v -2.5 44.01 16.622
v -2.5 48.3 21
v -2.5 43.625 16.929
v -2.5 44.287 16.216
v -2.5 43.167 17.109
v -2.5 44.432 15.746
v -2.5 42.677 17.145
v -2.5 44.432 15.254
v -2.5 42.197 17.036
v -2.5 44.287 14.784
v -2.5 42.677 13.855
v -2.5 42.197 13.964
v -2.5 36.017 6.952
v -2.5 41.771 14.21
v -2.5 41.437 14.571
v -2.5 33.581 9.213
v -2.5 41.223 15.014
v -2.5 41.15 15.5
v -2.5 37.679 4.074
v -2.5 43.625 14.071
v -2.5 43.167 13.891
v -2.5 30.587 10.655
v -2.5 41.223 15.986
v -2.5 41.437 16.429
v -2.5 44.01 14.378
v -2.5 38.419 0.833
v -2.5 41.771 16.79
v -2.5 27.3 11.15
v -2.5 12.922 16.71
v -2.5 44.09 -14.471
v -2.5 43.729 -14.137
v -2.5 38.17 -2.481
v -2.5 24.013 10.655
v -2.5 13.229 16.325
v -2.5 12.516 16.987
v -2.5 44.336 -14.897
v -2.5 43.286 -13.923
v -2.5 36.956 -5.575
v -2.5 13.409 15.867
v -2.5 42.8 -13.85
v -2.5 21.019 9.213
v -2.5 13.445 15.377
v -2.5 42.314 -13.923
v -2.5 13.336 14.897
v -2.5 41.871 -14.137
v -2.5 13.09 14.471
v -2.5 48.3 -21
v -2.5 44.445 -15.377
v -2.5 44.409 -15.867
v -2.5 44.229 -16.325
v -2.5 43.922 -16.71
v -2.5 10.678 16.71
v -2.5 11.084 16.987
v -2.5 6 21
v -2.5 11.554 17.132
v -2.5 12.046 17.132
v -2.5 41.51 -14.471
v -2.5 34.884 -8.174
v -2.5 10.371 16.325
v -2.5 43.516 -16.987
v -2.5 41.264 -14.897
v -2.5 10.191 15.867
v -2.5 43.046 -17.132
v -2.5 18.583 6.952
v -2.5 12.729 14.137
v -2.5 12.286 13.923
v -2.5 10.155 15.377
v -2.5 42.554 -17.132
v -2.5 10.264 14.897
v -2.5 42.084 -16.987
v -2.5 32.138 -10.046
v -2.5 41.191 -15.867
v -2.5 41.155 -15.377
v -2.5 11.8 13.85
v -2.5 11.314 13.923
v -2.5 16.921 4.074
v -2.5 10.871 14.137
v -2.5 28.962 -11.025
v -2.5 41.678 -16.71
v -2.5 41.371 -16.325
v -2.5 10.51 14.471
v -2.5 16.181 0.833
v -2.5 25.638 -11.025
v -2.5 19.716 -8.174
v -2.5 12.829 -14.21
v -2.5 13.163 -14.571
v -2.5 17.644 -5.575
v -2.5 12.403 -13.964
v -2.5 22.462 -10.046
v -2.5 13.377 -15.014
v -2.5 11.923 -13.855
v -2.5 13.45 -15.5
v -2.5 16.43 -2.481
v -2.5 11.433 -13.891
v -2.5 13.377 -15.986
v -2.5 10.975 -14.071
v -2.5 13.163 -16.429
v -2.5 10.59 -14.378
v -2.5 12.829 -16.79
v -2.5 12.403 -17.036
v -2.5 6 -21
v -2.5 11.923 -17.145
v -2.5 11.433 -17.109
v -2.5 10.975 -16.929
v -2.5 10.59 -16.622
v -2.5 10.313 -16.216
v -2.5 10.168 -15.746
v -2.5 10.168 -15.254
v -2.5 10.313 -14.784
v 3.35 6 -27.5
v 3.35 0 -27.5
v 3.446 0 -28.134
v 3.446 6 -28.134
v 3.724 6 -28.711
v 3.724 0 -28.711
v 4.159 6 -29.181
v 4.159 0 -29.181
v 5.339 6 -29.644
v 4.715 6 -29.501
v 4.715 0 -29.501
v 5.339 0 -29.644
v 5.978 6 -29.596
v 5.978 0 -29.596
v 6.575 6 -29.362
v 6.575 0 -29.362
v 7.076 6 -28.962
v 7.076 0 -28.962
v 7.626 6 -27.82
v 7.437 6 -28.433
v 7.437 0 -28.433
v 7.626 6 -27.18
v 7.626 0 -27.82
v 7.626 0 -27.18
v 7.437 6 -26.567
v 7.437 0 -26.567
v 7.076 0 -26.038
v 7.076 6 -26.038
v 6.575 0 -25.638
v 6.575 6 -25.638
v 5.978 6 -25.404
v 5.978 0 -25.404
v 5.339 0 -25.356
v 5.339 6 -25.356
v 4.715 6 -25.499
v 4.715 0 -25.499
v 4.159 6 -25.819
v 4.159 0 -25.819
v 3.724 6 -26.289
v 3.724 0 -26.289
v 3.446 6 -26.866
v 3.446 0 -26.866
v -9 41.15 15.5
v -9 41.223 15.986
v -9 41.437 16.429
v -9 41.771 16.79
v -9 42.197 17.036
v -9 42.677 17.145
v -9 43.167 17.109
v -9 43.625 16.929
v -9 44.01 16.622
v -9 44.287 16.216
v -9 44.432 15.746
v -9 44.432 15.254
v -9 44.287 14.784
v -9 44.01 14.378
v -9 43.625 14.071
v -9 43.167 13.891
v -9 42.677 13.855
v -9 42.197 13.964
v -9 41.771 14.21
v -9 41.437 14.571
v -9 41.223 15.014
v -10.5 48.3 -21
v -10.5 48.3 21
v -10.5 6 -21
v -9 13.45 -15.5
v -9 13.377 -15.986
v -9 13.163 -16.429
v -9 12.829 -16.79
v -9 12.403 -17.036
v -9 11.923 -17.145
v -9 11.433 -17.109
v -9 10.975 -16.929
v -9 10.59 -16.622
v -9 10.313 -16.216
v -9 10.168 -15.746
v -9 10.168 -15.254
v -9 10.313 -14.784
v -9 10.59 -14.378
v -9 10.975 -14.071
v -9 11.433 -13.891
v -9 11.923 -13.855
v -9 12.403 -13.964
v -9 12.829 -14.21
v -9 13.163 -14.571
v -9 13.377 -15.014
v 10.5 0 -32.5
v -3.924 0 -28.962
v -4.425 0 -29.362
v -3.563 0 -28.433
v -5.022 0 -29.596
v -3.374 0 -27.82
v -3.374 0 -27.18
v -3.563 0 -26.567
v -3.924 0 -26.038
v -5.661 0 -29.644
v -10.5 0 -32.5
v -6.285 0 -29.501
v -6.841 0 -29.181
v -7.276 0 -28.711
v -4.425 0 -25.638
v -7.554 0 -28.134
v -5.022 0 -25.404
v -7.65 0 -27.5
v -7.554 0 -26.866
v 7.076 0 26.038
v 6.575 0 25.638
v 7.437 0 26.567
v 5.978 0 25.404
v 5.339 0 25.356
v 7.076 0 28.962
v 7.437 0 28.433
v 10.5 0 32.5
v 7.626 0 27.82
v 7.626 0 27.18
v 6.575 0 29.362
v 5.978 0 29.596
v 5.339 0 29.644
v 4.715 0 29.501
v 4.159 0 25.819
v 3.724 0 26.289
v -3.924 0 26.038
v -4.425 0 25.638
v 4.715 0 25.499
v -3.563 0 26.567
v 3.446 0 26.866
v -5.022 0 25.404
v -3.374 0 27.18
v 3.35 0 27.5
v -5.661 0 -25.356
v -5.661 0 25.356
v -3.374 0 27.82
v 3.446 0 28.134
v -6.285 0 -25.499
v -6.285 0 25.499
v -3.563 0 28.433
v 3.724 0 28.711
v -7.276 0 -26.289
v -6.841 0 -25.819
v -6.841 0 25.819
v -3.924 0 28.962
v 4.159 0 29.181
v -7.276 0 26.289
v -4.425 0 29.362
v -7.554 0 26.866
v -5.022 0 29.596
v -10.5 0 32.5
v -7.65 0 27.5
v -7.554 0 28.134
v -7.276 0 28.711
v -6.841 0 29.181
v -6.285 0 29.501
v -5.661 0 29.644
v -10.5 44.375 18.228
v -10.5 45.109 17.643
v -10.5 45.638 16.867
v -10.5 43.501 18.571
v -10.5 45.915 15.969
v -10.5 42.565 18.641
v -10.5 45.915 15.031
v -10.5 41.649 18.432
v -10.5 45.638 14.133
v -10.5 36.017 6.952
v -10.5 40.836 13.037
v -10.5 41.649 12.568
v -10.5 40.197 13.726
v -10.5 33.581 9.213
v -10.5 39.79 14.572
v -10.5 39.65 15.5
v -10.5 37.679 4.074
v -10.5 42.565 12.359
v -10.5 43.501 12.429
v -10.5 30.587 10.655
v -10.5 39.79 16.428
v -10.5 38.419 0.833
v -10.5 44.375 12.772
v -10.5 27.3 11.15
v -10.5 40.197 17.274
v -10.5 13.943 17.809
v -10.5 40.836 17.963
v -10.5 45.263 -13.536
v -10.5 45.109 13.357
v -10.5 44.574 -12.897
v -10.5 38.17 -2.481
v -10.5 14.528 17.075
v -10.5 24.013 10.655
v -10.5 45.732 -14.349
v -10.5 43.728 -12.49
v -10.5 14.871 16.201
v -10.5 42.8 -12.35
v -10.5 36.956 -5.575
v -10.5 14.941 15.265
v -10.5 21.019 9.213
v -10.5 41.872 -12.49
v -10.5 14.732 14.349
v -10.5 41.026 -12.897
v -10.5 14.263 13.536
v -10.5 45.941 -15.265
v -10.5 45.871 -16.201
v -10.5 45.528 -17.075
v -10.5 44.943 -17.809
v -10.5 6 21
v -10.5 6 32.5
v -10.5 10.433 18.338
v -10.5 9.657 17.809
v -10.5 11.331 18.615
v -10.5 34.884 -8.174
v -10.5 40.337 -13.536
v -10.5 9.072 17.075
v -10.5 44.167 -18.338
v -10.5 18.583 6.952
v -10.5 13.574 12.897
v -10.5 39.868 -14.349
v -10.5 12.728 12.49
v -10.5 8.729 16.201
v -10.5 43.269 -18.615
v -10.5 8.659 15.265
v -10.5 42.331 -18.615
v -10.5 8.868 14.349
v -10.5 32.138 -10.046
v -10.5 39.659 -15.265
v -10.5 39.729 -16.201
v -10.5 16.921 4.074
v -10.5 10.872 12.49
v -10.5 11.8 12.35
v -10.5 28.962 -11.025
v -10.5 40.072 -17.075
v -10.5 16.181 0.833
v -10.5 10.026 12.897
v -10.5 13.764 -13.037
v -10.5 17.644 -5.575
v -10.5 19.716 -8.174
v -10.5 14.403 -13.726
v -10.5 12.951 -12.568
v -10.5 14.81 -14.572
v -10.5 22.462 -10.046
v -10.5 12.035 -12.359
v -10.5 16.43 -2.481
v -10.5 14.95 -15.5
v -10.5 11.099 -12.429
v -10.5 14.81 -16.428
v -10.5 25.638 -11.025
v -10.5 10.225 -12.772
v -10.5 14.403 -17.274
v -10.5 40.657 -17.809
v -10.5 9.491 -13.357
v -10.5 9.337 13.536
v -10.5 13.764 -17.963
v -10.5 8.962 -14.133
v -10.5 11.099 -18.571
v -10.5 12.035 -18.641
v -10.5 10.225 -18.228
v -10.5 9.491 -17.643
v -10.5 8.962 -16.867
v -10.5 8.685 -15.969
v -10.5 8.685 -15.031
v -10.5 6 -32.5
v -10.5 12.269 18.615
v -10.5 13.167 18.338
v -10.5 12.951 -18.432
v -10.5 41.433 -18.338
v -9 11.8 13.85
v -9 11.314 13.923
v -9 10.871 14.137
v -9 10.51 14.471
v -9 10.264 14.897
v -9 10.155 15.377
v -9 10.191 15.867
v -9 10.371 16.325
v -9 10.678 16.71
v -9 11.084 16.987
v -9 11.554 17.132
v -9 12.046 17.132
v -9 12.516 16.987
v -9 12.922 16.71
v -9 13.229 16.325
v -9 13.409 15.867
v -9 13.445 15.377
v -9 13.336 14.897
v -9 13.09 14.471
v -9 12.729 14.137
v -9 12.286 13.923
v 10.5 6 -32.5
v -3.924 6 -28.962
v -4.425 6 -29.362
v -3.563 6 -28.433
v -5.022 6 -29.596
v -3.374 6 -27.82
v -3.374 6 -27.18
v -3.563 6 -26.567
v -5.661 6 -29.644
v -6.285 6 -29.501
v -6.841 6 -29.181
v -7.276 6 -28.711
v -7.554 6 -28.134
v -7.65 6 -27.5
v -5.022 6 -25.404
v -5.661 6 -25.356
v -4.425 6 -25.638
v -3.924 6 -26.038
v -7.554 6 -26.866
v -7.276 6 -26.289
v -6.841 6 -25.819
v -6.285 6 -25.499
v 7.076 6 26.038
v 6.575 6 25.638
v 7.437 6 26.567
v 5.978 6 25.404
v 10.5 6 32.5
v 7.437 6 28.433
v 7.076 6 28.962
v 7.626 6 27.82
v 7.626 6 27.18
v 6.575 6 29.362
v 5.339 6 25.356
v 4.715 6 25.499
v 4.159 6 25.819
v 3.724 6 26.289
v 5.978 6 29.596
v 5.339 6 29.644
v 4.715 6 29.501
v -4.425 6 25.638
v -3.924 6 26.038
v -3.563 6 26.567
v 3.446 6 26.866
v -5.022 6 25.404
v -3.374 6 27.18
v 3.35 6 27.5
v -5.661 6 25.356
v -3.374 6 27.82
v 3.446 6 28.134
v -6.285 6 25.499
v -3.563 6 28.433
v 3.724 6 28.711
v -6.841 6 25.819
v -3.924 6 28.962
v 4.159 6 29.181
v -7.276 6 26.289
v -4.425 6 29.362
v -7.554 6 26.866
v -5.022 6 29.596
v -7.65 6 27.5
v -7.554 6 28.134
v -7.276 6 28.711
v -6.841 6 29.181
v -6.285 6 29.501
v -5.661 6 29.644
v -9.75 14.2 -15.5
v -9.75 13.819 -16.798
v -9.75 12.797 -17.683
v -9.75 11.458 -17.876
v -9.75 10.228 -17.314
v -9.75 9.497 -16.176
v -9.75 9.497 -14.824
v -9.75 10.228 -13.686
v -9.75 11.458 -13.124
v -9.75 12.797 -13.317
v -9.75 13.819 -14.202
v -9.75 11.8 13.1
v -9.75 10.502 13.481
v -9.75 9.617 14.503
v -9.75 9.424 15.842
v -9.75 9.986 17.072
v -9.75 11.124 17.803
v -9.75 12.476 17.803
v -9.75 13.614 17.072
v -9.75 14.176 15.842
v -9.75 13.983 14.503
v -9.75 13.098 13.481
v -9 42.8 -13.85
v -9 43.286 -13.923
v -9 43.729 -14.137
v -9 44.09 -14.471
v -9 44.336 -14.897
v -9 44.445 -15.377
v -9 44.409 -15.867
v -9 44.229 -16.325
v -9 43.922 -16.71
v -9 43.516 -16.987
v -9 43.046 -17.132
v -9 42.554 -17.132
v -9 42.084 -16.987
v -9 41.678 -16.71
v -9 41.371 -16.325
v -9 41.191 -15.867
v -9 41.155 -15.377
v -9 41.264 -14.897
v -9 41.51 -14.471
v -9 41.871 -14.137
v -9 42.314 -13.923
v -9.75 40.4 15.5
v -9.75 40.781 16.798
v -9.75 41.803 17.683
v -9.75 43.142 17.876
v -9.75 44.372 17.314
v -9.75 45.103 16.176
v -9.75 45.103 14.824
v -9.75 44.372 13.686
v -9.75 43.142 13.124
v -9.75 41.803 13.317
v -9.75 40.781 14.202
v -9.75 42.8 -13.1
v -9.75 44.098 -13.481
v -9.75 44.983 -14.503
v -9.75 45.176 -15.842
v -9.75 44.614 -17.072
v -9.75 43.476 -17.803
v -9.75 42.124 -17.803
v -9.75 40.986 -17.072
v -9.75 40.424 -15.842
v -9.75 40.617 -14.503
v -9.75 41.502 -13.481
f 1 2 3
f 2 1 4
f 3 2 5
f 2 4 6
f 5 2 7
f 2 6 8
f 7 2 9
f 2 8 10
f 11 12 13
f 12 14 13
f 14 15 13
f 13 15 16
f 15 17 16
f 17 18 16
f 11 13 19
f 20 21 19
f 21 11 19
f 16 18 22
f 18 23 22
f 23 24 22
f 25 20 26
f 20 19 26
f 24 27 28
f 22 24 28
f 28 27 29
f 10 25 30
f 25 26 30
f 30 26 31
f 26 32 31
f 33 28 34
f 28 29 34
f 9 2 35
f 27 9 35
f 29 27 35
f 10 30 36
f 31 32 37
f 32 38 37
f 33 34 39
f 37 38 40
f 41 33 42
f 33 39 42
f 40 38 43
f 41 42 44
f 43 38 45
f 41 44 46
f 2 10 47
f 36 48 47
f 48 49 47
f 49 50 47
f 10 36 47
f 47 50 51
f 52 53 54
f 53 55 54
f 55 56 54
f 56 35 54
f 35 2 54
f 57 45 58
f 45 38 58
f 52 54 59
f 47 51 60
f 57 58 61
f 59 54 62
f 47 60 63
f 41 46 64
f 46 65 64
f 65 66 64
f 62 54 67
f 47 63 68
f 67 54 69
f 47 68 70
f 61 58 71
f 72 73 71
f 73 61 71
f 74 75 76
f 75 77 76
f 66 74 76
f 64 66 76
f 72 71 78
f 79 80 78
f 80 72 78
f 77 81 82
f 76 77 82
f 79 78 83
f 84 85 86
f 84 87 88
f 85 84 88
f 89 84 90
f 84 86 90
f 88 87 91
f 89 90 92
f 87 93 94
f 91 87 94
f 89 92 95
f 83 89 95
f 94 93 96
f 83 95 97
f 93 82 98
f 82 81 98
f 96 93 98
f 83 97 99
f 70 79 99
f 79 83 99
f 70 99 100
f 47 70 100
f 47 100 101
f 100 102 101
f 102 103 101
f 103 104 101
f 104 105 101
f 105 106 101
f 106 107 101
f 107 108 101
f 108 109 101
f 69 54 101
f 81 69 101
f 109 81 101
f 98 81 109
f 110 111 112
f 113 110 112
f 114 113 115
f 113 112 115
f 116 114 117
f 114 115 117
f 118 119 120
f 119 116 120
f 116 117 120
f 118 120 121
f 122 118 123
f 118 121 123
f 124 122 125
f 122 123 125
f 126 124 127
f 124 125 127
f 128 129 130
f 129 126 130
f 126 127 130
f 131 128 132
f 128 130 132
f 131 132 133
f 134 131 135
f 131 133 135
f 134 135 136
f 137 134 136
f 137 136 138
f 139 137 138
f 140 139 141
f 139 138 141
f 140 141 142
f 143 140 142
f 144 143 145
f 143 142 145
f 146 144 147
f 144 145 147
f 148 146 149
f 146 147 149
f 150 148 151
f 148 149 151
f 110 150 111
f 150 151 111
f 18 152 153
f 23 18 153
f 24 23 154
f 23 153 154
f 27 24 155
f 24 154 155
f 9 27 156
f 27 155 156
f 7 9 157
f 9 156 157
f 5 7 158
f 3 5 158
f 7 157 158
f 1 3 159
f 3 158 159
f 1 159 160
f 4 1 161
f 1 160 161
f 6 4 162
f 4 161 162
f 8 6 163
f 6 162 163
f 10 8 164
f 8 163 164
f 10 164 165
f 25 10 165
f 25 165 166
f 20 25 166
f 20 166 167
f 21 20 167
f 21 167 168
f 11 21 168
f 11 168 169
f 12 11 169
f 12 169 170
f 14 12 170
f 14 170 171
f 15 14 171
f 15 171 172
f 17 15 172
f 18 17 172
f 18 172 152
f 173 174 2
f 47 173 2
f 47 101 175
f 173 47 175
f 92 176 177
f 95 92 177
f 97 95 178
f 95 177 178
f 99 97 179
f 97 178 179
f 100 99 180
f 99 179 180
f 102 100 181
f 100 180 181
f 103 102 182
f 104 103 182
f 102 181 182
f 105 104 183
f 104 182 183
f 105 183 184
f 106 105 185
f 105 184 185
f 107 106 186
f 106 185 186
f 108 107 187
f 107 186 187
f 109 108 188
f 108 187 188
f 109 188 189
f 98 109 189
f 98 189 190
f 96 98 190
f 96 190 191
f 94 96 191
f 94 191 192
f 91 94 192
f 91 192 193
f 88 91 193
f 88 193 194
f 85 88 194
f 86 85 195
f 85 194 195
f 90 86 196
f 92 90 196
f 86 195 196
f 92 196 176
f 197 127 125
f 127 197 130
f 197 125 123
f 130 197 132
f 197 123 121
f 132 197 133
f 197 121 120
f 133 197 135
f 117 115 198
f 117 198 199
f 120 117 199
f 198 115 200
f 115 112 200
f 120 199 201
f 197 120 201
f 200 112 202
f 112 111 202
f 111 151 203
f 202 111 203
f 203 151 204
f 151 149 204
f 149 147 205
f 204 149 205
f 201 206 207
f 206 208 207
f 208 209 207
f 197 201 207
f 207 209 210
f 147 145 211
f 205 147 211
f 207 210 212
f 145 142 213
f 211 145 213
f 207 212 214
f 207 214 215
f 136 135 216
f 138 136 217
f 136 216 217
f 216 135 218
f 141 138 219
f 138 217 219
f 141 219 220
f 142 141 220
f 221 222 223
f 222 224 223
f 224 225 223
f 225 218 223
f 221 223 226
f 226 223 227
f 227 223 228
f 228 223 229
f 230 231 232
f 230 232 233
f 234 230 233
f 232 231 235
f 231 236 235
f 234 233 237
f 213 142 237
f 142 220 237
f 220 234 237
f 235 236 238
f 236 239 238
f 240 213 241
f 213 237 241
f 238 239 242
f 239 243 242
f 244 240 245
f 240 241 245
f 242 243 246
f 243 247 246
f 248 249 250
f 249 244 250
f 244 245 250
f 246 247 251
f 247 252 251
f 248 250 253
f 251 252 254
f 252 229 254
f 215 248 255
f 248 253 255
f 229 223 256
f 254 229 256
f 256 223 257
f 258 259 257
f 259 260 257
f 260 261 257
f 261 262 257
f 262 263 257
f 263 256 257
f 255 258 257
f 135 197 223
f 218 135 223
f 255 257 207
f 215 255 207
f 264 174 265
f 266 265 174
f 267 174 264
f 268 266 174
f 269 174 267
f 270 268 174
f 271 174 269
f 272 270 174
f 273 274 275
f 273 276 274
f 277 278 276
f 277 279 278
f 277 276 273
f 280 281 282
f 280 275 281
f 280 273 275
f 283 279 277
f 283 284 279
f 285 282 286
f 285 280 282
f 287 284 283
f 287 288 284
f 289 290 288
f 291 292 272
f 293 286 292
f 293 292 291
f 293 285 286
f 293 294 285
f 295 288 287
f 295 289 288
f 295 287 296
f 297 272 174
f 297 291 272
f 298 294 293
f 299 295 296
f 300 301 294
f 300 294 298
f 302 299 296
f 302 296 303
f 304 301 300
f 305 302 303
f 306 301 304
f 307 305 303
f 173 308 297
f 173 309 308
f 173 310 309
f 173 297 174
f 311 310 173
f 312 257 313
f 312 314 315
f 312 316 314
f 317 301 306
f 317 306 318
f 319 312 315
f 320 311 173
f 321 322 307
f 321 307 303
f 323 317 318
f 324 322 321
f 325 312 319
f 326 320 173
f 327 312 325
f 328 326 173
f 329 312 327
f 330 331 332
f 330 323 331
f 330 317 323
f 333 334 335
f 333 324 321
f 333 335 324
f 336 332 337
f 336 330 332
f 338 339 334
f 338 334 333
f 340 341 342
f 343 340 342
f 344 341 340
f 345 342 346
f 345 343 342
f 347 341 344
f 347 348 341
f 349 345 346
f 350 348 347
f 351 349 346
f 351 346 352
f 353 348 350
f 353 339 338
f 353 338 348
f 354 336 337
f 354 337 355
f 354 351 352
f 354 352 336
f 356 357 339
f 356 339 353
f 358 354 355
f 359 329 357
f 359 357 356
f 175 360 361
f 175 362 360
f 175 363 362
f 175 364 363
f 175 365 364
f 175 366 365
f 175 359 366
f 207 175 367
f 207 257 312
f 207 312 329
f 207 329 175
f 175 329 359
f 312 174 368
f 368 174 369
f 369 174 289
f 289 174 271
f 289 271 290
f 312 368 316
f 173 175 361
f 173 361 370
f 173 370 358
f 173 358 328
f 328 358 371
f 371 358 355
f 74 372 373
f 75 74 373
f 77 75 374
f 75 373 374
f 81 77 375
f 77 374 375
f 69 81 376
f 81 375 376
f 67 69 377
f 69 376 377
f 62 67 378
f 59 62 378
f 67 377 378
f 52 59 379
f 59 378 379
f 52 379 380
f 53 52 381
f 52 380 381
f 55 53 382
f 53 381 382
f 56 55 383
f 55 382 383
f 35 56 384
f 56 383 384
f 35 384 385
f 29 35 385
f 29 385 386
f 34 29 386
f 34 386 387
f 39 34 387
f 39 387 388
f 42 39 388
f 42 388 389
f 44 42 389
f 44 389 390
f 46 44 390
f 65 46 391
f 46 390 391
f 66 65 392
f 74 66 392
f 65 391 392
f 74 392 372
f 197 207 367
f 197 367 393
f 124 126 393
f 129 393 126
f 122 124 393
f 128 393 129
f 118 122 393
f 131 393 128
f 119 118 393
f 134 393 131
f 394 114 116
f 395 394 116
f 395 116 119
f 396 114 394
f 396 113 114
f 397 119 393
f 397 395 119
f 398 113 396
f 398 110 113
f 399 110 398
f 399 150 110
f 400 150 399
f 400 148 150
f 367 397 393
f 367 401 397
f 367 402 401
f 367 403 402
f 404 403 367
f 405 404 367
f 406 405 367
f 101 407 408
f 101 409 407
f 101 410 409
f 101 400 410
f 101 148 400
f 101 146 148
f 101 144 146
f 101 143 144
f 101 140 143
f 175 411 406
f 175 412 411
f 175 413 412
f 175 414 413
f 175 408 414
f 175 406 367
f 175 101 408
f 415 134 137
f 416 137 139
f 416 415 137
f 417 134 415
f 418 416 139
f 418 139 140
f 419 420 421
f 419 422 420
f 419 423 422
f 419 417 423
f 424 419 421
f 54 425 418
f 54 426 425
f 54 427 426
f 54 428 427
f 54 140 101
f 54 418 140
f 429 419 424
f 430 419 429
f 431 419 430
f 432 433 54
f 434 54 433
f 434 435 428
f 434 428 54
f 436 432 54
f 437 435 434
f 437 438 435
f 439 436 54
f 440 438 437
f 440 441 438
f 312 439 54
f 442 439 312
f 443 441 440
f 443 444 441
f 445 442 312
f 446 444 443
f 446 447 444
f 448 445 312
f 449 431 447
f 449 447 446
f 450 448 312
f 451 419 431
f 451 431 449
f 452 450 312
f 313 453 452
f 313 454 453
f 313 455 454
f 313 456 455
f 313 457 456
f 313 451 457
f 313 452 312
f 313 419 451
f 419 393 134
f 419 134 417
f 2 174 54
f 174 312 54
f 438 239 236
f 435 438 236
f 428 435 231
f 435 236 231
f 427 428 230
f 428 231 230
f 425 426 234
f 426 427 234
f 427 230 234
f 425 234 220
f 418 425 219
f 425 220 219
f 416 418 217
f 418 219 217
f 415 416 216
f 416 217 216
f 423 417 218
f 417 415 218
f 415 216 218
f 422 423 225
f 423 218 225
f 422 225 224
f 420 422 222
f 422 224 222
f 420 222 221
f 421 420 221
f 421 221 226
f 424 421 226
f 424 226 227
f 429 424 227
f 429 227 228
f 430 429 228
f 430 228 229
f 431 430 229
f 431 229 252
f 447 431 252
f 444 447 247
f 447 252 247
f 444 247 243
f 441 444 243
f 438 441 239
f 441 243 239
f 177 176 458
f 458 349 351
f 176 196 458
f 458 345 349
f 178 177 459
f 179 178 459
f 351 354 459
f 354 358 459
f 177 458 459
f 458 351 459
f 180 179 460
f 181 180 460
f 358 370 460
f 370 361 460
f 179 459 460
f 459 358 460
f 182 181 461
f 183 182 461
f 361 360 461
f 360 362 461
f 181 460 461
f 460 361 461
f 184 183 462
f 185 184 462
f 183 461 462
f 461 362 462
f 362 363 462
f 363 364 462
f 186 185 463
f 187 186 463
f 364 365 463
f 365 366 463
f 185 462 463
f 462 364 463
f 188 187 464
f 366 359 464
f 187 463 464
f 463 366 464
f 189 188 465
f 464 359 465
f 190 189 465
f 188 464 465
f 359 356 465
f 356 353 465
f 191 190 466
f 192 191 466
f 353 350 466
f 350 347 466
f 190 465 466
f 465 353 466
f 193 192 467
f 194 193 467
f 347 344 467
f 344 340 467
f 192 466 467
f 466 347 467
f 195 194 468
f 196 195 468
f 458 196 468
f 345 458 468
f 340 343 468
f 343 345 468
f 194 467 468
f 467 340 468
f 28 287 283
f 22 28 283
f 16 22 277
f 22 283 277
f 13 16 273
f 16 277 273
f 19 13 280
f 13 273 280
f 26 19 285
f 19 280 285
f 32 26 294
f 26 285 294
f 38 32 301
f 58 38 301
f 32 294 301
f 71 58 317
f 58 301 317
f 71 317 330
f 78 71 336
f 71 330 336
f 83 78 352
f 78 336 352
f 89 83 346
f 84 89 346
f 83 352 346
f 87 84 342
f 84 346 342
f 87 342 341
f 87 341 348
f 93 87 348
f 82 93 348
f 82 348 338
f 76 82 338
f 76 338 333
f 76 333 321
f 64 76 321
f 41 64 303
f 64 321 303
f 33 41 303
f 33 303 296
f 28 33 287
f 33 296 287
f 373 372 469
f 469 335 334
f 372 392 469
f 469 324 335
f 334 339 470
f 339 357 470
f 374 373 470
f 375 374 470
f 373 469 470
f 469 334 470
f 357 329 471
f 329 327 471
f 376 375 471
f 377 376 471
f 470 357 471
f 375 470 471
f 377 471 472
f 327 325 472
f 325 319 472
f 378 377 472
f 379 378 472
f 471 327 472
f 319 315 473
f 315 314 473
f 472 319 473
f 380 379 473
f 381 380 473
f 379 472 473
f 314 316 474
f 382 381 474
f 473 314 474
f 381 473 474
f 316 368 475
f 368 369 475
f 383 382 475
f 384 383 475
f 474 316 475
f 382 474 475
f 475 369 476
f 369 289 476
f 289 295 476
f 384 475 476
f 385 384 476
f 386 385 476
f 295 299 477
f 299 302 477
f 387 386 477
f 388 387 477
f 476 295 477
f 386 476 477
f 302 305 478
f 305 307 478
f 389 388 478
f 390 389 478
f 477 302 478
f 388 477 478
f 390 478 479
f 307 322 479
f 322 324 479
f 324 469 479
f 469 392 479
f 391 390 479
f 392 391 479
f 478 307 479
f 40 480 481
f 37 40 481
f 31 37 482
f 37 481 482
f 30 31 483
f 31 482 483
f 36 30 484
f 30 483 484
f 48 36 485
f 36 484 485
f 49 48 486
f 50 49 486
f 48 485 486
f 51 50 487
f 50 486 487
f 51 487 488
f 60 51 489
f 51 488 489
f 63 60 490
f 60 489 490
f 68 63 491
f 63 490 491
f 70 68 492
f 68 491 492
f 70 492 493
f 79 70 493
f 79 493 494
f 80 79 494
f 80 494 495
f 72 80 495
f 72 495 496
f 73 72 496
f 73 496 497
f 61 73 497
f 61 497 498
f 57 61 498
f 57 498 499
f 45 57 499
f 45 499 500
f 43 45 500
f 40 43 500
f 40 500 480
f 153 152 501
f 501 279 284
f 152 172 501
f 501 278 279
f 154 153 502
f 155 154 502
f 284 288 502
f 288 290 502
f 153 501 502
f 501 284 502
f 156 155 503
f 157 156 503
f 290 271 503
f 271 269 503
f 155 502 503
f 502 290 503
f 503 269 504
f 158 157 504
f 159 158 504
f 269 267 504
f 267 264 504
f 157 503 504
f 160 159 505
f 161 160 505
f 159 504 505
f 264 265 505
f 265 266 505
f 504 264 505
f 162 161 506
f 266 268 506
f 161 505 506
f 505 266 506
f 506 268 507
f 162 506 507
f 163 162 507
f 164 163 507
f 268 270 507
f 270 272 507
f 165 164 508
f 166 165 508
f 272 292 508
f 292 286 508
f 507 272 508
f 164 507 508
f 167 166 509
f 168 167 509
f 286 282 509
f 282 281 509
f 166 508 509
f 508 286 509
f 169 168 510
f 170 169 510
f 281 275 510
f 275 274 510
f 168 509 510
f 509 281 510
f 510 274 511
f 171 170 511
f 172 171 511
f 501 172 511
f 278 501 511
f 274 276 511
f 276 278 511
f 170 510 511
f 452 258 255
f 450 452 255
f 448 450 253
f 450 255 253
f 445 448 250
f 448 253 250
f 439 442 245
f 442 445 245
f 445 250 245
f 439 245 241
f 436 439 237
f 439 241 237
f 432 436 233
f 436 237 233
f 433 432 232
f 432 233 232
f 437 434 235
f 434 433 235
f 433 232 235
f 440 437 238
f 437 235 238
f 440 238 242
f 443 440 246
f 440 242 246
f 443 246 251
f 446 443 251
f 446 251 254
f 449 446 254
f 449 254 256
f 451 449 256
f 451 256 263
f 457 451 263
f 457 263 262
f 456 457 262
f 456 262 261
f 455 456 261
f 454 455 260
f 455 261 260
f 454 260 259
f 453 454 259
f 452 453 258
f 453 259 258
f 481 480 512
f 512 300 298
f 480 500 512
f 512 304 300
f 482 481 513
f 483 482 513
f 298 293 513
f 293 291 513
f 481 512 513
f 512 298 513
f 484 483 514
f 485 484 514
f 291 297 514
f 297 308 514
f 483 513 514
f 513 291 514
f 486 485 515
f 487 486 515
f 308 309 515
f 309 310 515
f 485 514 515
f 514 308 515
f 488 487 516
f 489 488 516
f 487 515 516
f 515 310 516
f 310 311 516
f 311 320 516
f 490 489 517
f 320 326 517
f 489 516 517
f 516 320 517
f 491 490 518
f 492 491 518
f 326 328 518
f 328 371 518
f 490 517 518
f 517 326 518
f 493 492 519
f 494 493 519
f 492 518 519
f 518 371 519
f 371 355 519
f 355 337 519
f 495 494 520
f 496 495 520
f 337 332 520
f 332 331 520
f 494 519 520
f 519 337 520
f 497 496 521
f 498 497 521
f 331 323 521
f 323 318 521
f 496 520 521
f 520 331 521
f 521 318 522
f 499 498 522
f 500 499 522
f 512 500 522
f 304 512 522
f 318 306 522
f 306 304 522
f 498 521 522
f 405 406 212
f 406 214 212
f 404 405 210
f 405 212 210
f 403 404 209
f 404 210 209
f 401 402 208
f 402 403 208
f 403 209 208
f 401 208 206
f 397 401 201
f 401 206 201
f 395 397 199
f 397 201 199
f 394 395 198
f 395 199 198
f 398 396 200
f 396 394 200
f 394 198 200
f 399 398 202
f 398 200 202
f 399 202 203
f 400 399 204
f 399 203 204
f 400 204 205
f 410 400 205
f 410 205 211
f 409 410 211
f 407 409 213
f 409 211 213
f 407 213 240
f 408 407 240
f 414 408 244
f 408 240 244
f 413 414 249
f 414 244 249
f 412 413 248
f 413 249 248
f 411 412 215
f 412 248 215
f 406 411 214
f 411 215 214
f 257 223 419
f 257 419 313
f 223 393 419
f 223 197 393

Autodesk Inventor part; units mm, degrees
ref_plane "YZ Plane" through (0, 0, 0) normal (1, 0, 0) x (0, 1, 0)
ref_plane "XZ Plane" through (0, 0, 0) normal (0, 1, 0) x (-1, 0, 0)
ref_plane "XY Plane" through (0, 0, 0) normal (0, 0, 1) x (1, 0, 0)
sketch "Boceto1" plane through (0, 0, 0) normal (0, 1, 0) x (-1, 0, 0)
  line L0 (-10.5, 32.5) -> (10.5, 32.5)
  line L1 (10.5, 32.5) -> (10.5, -32.5)
  line L2 (10.5, -32.5) -> (-10.5, -32.5)
  line L3 (-10.5, -32.5) -> (-10.5, 32.5)
  line L4 (-10.5, 32.5) -> (10.5, -32.5) construction
  line L5 (10.5, 32.5) -> (-10.5, -32.5) construction
  circle A0 centre (5.5, 27.5) radius 2.15
  circle A1 centre (-5.5, 27.5) radius 2.15
  circle A2 centre (5.5, -27.5) radius 2.15
  circle A3 centre (-5.5, -27.5) radius 2.15
  point P0 (0, 0)
  dimension "d0" = 4.3
  dimension "d1" = 55
  dimension "d2" = 65
  dimension "d3" = 11
  dimension "d4" = 5
  dimension "d5" = 21
  dimension "d6" = 5
extrude "Extrusión1" add sketch "Boceto1" along normal blind 6
sketch "Boceto2" plane through (0, 6, 0) normal (0, 1, 0) x (1, 0, 0)
  line L0 (-10.5, 32.5) -> (-10.5, -32.5) projected
  line L1 (-10.5, -21) -> (-2.5, -21)
  line L2 (-2.5, -21) -> (-2.5, 21)
  line L3 (-2.5, 21) -> (-10.5, 21)
  line L4 (-10.5, 21) -> (-10.5, -21)
  point P0 (0, 0)
  point P1 (-10.5, 21)
  dimension "d9" = 42
  dimension "d10" = 21
  dimension "d11" = 8
extrude "Extrusión2" add sketch "Boceto2" along normal blind 42.3
sketch "Boceto3" plane through (-10.5, 0, -32.5) normal (-1, 0, 0) x (0, 0, 1)
  line L0 (11.5, 48.3) -> (53.5, 48.3) projected
  line L1 (53.5, 6) -> (53.5, 48.3) projected
  line L2 (11.5, 48.3) -> (53.5, 48.3)
  line L3 (53.5, 48.3) -> (53.5, 6.3)
  line L4 (53.5, 6.3) -> (11.5, 6.3)
  line L5 (11.5, 6.3) -> (11.5, 48.3)
  circle A0 centre (32.5, 27.3) radius 11.15
  point P0 (32.5, 0)
  dimension "d14" = 42
  dimension "d15" = 22.3
  dimension "d16" = 21
  dimension "d17" = 21
extrude "Extrusión3" cut sketch "Boceto3" against normal through all contours A0
sketch "Boceto4" plane through (-10.5, 0, -32.5) normal (-1, 0, 0) x (0, 0, 1)
  circle A0 centre (17, 42.8) radius 1.65
  circle A1 centre (32.5, 27.3) radius 11.15 projected
  point P0 (32.5, 0)
  dimension "d20" = 15.5
  dimension "d22" = 15.5
  dimension "d23" = 3.3
extrude "Extrusión4" cut sketch "Boceto4" against normal through all contours A0
chamfer "Chaflán1" distance 1.5 angle 45 1 edges at (-10.5, 42.8, -17.15)
pattern_circular "Patrón circular1" count 4 over 360 about axis through (-10.5, 27.3, 0) along (1, 0, 0) of "Extrusión4", "Chaflán1"
properties part number "elbowmotorsupport"
